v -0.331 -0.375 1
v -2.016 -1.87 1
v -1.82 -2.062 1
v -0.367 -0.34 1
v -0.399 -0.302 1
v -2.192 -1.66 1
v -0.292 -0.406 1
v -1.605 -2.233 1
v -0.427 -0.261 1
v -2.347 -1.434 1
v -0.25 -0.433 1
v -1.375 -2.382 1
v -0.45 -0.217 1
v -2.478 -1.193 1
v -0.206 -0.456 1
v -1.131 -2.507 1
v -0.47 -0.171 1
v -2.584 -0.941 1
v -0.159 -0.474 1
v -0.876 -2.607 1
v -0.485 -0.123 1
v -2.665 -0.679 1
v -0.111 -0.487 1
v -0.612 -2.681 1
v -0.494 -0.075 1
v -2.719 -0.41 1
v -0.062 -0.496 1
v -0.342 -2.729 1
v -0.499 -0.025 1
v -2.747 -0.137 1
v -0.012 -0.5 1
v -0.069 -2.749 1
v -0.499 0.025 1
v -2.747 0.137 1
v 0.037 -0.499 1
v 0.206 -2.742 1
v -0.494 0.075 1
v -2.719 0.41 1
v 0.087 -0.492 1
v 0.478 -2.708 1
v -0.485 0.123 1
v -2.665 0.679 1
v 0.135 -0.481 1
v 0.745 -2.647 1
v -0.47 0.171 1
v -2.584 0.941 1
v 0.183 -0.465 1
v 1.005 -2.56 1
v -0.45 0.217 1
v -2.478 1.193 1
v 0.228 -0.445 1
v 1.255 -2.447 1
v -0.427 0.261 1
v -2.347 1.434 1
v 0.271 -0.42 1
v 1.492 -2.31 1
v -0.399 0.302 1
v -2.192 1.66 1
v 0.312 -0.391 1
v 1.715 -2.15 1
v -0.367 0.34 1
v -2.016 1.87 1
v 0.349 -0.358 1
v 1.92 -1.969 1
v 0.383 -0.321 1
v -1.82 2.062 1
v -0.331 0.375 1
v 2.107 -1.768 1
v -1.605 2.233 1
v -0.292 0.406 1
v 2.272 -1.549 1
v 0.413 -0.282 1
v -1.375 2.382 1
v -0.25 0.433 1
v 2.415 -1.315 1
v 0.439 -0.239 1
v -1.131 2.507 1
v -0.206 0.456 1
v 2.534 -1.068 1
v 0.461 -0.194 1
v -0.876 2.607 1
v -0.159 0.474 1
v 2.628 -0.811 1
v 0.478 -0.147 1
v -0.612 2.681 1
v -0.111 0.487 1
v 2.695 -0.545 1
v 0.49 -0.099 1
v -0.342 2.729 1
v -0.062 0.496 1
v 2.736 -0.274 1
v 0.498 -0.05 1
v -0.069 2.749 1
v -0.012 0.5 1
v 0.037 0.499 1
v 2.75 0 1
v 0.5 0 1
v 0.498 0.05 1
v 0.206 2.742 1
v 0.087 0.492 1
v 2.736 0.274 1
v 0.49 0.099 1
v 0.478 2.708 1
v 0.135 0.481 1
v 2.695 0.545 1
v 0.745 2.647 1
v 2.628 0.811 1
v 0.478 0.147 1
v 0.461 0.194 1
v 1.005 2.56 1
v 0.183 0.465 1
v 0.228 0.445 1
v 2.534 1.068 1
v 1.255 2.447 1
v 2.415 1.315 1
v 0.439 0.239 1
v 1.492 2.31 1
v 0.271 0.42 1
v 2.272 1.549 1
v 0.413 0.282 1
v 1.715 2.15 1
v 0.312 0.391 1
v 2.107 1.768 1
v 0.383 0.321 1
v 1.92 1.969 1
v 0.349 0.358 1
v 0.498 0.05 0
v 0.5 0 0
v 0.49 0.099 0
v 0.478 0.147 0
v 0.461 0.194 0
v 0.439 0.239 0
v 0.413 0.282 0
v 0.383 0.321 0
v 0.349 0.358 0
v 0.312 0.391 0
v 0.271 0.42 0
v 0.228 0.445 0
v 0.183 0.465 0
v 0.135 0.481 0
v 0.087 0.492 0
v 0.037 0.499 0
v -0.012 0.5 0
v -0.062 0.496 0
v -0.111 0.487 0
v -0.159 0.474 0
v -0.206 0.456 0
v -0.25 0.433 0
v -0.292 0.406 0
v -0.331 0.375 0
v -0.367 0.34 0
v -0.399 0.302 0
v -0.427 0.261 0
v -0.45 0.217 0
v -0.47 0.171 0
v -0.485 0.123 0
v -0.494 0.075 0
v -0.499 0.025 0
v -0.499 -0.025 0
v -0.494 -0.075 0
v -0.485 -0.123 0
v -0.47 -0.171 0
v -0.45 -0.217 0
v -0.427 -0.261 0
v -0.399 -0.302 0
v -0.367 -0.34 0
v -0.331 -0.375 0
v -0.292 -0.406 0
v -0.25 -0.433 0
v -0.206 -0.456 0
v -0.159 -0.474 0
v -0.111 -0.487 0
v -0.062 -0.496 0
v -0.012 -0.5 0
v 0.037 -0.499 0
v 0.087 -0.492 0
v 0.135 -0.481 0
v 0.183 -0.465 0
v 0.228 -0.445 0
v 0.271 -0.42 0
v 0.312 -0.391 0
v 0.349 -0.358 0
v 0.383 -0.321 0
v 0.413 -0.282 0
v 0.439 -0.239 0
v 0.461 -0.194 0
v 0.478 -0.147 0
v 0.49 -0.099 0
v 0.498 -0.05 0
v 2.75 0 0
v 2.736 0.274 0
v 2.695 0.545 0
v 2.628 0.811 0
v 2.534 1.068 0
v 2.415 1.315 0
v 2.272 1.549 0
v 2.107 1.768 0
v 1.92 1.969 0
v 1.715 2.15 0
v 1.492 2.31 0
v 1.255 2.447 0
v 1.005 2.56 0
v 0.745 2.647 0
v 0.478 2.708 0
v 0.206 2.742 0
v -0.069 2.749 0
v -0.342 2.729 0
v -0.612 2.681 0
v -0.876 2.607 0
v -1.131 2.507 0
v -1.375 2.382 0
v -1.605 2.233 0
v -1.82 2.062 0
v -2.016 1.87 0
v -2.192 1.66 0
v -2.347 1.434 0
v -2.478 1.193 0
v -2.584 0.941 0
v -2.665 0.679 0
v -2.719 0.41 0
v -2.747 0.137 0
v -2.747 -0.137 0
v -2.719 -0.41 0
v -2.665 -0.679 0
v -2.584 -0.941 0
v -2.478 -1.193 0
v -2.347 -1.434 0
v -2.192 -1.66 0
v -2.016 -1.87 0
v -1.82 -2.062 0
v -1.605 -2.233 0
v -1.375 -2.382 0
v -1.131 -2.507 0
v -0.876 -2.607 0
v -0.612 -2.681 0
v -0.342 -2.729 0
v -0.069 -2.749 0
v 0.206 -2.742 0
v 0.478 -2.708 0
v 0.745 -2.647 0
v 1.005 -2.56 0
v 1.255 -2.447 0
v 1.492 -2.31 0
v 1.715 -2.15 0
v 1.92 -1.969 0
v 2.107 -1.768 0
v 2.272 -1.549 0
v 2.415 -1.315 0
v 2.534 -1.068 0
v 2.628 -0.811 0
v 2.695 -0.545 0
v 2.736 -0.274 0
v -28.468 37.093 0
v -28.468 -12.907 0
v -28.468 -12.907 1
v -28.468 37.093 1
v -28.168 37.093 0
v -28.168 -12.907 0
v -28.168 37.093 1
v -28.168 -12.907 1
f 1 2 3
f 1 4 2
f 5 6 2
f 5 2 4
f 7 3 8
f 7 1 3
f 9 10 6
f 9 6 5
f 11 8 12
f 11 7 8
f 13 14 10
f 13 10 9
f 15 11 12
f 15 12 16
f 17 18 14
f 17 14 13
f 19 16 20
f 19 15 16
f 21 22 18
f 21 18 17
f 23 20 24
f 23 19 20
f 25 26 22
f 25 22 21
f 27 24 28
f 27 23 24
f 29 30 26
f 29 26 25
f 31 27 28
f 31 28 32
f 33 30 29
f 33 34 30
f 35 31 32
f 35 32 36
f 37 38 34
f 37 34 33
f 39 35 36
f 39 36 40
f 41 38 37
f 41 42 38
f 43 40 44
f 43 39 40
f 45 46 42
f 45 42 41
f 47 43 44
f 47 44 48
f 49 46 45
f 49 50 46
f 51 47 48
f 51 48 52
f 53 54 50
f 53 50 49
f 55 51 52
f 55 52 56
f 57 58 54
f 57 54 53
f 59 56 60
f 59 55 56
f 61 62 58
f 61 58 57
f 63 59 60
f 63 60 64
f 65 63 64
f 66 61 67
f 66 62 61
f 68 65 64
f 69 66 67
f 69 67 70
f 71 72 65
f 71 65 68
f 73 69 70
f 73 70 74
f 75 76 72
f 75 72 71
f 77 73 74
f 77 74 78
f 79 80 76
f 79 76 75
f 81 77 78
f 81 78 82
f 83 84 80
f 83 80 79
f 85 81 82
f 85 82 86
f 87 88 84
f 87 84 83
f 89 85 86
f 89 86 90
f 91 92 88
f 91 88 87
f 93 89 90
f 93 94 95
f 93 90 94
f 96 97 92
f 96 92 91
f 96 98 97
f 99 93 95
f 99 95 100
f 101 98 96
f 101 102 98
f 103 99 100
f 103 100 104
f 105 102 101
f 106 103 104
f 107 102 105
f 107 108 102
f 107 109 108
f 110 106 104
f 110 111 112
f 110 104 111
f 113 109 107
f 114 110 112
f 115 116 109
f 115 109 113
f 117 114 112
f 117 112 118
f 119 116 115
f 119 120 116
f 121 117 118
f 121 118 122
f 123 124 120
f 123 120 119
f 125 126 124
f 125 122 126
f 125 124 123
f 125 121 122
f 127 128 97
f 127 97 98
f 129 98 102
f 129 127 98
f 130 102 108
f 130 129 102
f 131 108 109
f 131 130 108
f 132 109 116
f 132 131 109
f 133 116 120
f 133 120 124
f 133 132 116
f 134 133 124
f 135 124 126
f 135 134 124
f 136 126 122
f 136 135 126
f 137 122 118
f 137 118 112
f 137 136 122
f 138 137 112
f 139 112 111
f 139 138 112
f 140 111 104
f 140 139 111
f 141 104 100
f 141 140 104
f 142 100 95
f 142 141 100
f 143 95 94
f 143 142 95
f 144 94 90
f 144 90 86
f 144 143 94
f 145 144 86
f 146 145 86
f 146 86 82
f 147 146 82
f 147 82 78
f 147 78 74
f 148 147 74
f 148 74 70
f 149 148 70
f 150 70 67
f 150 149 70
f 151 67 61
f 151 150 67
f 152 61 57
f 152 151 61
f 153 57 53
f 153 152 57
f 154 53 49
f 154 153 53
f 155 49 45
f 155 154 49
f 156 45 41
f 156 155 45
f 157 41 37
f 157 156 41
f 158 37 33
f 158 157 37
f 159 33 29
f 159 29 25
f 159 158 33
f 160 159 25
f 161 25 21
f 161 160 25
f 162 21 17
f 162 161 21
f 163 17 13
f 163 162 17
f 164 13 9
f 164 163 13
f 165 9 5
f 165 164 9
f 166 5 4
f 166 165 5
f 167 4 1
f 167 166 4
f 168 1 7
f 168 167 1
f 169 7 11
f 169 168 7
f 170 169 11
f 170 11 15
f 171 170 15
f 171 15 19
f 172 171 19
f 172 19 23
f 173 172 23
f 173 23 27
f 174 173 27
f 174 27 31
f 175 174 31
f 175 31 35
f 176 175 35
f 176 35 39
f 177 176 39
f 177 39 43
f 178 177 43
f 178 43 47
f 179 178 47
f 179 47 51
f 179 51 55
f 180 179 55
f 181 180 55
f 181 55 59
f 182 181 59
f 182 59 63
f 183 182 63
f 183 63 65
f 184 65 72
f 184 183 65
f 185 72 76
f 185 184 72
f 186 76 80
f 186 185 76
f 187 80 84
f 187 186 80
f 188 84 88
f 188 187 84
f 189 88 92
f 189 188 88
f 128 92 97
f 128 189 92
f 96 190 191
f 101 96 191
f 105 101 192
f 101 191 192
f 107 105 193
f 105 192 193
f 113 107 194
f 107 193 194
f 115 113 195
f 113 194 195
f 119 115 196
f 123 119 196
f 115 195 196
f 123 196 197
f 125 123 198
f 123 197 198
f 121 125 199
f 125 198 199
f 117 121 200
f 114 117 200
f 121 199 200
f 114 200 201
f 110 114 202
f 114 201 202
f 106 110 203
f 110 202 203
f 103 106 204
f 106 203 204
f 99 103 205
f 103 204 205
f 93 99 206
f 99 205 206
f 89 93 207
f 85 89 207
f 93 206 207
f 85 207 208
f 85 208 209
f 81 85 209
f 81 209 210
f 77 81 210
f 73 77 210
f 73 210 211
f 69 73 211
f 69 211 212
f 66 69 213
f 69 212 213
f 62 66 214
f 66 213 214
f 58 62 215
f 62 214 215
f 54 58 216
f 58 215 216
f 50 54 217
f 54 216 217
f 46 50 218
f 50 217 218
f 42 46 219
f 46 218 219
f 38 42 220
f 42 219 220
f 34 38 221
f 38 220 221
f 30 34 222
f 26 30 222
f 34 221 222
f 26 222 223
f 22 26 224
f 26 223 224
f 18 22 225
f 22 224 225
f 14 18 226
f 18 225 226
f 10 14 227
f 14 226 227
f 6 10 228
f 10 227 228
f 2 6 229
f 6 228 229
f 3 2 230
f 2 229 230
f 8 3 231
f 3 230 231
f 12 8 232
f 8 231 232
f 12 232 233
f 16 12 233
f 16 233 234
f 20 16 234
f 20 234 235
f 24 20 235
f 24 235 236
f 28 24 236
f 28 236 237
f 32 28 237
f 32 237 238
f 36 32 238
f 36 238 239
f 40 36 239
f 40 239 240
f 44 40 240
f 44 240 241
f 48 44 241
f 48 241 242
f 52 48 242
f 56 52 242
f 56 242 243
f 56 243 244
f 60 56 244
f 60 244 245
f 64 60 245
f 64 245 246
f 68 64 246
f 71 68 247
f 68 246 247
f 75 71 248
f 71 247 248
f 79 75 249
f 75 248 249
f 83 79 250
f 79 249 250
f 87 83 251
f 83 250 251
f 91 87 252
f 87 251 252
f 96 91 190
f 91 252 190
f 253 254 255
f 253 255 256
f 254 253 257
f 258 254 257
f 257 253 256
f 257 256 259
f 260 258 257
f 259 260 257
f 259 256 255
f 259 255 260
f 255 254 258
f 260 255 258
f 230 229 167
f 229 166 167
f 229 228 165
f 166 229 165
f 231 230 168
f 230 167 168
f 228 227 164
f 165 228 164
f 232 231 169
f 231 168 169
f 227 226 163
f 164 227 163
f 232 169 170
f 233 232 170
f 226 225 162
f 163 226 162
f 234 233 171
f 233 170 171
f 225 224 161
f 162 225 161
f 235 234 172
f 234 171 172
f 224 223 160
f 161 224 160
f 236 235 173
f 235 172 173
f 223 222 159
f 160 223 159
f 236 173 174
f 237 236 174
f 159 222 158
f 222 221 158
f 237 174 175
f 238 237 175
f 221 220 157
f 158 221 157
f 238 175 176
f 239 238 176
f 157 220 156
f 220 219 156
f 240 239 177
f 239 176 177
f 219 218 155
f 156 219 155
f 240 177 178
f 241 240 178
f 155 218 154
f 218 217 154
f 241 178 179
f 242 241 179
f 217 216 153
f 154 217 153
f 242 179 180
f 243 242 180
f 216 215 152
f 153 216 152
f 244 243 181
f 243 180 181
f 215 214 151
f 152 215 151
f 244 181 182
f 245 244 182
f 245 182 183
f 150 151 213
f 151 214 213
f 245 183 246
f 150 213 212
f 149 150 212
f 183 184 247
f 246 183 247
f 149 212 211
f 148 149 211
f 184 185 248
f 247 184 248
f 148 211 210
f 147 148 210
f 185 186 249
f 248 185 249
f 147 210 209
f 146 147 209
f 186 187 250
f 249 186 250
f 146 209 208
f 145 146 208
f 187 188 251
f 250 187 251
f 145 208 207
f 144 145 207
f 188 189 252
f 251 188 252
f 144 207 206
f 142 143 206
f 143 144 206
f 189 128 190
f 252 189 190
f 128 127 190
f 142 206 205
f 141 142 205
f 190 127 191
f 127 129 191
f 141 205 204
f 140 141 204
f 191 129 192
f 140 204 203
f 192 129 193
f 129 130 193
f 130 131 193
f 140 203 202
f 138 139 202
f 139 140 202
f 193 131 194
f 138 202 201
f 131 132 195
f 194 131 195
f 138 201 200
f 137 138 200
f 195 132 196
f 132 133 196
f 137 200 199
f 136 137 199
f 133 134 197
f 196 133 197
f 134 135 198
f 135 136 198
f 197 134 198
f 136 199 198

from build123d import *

# Parameters (mm, degrees)
F0_R     = 2.75
F0_R_2   = 0.5
F0_W     = 0.3
F0_H     = 50
F1_DEPTH = 1


with BuildPart() as f1:
    # F0 (on Top) → F1 (new body)
    with BuildSketch(Plane.XY):
        Circle(F0_R)
        Circle(F0_R_2, mode=Mode.SUBTRACT)
        with Locations((-28.318391, 12.092679)):
            Rectangle(F0_W, F0_H)
    extrude(amount=F1_DEPTH)


solid = f1.part
